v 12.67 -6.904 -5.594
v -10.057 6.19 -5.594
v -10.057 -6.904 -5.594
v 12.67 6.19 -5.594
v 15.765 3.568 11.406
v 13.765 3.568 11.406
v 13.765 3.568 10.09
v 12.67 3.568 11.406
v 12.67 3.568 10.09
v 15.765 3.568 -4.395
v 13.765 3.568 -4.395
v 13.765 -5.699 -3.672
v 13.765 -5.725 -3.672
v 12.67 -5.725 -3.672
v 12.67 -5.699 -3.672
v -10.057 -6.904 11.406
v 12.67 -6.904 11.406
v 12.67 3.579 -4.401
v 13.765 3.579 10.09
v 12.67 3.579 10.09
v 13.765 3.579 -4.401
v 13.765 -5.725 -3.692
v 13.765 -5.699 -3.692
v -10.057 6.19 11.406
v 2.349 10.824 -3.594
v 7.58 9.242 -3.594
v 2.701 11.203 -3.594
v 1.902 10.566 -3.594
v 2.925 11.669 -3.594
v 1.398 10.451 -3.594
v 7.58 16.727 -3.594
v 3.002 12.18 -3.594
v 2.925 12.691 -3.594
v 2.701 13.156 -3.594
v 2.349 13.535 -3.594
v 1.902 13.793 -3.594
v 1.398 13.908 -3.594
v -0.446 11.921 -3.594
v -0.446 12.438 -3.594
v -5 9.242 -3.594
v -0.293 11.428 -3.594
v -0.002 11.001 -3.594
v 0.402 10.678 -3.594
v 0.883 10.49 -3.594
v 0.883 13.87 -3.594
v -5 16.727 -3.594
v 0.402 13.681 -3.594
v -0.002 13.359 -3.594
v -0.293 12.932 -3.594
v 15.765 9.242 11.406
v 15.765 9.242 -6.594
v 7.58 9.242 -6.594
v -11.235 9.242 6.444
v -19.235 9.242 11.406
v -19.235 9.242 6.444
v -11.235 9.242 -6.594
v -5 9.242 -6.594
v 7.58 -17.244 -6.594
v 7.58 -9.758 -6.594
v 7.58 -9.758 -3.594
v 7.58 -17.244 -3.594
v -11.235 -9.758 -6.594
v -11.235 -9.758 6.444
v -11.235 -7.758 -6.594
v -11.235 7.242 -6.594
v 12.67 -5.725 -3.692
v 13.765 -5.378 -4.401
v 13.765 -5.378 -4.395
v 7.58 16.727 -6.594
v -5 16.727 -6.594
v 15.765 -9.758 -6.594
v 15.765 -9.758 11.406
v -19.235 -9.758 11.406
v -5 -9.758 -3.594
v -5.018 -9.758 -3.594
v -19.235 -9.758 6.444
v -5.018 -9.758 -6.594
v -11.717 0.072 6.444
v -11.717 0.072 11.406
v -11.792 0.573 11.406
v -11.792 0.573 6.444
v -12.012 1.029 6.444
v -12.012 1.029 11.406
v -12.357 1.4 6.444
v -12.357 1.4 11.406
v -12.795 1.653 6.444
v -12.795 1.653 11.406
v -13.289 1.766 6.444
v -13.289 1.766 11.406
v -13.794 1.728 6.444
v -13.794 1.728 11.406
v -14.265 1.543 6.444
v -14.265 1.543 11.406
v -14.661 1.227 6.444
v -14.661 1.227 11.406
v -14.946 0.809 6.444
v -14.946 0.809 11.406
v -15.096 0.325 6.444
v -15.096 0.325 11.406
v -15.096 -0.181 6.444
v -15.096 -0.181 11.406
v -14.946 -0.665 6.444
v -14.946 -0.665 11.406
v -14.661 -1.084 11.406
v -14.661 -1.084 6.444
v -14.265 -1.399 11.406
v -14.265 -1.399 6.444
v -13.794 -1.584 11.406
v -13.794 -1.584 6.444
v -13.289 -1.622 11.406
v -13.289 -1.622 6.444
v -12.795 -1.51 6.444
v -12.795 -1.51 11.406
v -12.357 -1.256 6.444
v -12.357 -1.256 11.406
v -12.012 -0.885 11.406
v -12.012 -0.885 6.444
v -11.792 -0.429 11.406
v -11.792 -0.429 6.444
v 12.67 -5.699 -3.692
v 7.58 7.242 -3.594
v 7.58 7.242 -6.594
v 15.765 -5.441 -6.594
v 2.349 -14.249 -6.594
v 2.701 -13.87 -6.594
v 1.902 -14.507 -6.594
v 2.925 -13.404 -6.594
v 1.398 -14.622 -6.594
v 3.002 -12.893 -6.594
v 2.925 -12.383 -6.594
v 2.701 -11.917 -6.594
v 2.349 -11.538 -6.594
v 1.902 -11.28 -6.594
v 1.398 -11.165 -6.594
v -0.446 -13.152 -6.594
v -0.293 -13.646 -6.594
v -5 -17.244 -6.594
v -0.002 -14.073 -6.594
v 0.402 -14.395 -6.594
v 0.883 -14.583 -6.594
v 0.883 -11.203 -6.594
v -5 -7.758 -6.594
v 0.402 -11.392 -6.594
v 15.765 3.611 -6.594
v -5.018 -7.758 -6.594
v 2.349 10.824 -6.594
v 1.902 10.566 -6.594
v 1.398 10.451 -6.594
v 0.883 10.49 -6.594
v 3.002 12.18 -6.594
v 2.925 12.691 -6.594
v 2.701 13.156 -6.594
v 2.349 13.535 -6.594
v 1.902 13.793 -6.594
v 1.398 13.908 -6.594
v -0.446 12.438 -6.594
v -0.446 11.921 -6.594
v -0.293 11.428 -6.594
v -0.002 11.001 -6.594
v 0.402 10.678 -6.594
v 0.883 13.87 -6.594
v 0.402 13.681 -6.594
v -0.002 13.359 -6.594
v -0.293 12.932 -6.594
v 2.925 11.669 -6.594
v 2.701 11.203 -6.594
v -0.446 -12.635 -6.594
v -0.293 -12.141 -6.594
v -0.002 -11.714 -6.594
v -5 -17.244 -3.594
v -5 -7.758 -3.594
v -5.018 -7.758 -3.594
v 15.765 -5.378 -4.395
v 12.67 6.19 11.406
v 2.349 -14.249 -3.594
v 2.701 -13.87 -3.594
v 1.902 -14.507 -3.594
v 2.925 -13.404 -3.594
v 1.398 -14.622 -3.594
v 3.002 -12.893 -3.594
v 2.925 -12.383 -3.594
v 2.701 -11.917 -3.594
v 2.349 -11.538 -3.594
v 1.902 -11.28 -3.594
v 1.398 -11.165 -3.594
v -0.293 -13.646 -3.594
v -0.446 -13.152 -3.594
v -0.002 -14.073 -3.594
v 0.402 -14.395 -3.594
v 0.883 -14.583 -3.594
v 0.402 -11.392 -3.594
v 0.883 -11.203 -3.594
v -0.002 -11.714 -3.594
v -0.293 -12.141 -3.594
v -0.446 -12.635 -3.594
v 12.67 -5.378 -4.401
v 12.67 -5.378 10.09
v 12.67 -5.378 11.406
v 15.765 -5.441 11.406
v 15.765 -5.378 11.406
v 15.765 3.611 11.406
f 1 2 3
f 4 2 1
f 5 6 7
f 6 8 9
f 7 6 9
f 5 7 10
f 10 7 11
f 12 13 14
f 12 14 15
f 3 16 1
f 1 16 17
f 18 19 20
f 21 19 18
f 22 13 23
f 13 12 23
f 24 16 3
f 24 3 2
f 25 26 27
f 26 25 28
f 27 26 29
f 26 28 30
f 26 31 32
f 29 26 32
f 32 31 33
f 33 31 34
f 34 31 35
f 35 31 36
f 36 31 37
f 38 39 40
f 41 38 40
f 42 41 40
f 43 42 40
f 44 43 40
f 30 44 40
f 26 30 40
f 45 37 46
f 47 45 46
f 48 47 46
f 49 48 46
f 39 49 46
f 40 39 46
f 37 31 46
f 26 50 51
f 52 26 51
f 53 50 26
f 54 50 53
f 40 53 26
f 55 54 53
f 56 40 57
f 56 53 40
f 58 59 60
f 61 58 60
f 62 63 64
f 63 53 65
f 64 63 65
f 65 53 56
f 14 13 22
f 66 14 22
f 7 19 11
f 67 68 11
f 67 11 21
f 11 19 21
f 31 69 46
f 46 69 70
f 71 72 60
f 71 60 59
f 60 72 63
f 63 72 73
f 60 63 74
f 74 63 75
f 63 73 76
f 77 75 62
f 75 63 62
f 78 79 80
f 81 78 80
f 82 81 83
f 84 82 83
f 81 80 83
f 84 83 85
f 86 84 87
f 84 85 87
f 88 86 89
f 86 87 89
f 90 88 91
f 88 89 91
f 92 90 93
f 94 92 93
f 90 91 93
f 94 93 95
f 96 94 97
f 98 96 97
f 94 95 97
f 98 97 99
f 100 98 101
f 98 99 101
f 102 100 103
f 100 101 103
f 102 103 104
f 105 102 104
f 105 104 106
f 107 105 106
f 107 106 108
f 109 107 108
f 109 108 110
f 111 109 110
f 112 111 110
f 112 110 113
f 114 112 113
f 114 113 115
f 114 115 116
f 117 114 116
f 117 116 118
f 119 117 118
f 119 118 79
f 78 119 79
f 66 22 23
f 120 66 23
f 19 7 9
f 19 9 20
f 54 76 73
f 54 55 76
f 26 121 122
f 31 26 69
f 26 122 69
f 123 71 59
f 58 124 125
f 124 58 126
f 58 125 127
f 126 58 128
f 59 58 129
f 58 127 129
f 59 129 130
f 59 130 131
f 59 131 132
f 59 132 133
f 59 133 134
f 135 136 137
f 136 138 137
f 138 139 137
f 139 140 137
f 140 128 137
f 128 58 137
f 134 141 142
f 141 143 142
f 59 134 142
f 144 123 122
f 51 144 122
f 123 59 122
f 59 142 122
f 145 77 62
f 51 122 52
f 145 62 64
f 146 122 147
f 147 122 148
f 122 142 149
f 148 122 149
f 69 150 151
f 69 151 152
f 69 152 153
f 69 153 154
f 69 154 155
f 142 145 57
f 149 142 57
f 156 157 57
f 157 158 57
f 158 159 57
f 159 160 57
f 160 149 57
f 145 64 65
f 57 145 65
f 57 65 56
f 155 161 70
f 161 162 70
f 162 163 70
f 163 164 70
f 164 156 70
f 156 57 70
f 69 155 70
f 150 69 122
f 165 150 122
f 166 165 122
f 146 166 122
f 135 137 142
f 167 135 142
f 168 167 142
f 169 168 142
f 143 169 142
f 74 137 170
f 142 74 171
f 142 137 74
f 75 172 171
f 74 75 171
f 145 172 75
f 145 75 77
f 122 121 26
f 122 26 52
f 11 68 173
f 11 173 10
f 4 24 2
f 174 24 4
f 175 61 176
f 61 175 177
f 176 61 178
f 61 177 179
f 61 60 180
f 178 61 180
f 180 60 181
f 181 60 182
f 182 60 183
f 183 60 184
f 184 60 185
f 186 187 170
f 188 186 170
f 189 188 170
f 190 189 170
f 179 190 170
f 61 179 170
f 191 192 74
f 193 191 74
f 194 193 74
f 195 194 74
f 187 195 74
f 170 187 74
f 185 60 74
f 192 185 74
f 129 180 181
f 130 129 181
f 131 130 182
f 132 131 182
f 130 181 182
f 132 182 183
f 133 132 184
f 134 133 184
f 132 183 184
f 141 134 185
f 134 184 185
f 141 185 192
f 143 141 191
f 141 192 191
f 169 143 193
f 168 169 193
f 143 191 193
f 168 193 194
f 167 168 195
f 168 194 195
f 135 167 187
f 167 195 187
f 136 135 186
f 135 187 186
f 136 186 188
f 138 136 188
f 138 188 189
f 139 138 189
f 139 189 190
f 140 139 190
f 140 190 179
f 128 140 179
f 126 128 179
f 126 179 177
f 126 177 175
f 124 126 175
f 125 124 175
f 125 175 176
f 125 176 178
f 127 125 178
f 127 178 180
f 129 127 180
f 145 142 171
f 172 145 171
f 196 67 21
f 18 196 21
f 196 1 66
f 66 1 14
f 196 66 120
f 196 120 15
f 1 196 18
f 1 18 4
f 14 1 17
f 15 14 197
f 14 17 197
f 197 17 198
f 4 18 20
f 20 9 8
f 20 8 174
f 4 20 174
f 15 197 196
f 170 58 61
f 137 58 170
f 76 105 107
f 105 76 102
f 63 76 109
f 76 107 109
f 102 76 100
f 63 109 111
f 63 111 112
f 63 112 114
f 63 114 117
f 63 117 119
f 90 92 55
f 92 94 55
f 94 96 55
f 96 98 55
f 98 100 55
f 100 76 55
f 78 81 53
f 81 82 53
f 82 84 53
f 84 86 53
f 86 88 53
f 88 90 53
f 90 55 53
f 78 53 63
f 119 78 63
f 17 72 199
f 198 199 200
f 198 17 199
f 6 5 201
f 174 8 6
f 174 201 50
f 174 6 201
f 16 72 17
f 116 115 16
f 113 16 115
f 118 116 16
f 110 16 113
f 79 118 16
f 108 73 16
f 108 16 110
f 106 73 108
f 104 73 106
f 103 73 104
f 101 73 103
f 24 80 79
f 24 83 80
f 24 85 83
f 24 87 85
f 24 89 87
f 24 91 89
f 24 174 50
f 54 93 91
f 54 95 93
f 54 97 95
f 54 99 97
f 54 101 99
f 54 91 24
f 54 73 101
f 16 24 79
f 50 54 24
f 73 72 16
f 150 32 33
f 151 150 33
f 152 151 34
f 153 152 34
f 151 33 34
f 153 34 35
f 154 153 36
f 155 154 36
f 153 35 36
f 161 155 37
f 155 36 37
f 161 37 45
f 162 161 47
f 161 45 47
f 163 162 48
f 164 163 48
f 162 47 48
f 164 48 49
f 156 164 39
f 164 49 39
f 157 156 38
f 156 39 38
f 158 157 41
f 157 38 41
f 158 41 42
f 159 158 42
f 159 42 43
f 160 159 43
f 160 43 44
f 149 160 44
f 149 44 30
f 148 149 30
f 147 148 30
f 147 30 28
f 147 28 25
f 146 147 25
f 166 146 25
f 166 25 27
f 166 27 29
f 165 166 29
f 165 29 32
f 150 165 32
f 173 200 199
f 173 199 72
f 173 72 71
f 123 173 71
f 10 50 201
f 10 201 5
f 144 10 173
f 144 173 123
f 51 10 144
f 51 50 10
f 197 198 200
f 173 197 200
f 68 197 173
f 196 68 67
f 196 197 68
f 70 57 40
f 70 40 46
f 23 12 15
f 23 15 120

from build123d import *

# Parameters (mm, degrees)
SKETCH1_W            = 2.5
SKETCH1_H            = 1.5
BOSS_EXTRUDE1_DEPTH  = 1.8
SKETCH2_W            = 2.272709172
SKETCH2_H            = 1.309335963
CUT_EXTRUDE1_DEPTH   = 1.7
SKETCH3_W            = 0.001965442
SKETCH3_H            = 0.00266433
SKETCH3_W_2          = 1.44909182
SKETCH3_H_2          = 0.895759853
CUT_EXTRUDE2_DEPTH   = 1.8
SCALE1_SCALE         = 10
SKETCH6_W            = 3.399300392
SKETCH6_H            = 8.946780682
CUT_EXTRUDE4_DEPTH   = 10
SKETCH12_W           = 4.961896536
SKETCH12_H           = 15
BOSS_EXTRUDE5_DEPTH  = 8
SKETCH13_R           = 1.698754484
CUT_EXTRUDE6_DEPTH   = 34
SKETCH22_W           = 12.579678002
SKETCH22_H           = 9.485518979
BOSS_EXTRUDE10_DEPTH = 3
SKETCH25_R           = 1.733474482
CUT_EXTRUDE7_DEPTH   = 36
SKETCH26_W           = 6.246850144
SKETCH26_H           = 18
BOSS_EXTRUDE11_DEPTH = 2
SKETCH27_W           = 6.184798315
SKETCH27_H           = 18
BOSS_EXTRUDE12_DEPTH = 2
SKETCH28_W           = 12.580266047
SKETCH28_H           = 15
BOSS_EXTRUDE13_DEPTH = 2
SKETCH29_W           = 6.217055849
SKETCH29_H           = 18
BOSS_EXTRUDE14_DEPTH = 2
SKETCH30_W           = 6.149592849
SKETCH30_H           = 18
BOSS_EXTRUDE15_DEPTH = 2
SKETCH31_W           = 12.597557791
SKETCH31_H           = 15
BOSS_EXTRUDE16_DEPTH = 2
SKETCH32_W           = 8
SKETCH32_H           = 4.961896536
BOSS_EXTRUDE17_DEPTH = 2
SKETCH33_W           = 0.035793511
SKETCH33_H           = 18
BOSS_EXTRUDE18_DEPTH = 2
SKETCH34_W           = 8
SKETCH34_H           = 4.961896536
BOSS_EXTRUDE19_DEPTH = 2
SKETCH36_W           = 18
SKETCH36_H           = 4.317479632
BOSS_EXTRUDE20_DEPTH = 2
SKETCH37_W           = 18
SKETCH37_H           = 5.630697462
BOSS_EXTRUDE21_DEPTH = 2
SKETCH38_W           = 2.199407661
SKETCH38_H           = 9.051822906
BOSS_EXTRUDE22_DEPTH = 2
SKETCH39_W           = 15.800592339
SKETCH39_H           = 0.042851216
BOSS_EXTRUDE23_DEPTH = 2
SKETCH40_W           = 15.800592339
SKETCH40_H           = 0.062191008
BOSS_EXTRUDE24_DEPTH = 2


with BuildPart() as part:
    # Sketch1 → Boss-Extrude1 (new body)
    with BuildSketch(Plane.XY):
        with Locations((0.15674366, 0.085055811)):
            Rectangle(SKETCH1_W, SKETCH1_H)
    extrude(amount=BOSS_EXTRUDE1_DEPTH)

    # Sketch2 → Cut-Extrude1 (cut)
    with BuildSketch(Plane.XY.offset(1.8)):
        with Locations((0.160861454, 0.075181403)):
            Rectangle(SKETCH2_W, SKETCH2_H)
    extrude(amount=-CUT_EXTRUDE1_DEPTH, mode=Mode.SUBTRACT)

    # Sketch3 → Cut-Extrude2 (cut)
    with BuildSketch(Plane(origin=(1.40674366, 0, 0), x_dir=(0, 0, -1), z_dir=(1, 0, 0))):
        with Locations((-0.29122496, -0.460339146)):
            Rectangle(SKETCH3_W, SKETCH3_H)
        with Locations((-0.943862586, 0.020902802)):
            Rectangle(SKETCH3_W_2, SKETCH3_H_2)
    extrude(amount=-CUT_EXTRUDE2_DEPTH, mode=Mode.SUBTRACT)


with BuildPart() as part_1:
    # Scale1: scaled about (0.033599126, 0.123190455, 0.732690955)
    add(part.part.scale(SCALE1_SCALE).moved(Location((-0.302392134, -1.108714095, -6.594218595))))

    # Sketch6 → Cut-Extrude4 (cut)
    with BuildSketch(Plane(origin=(13.765044467, 0, 0), x_dir=(0, 0, -1), z_dir=(1, 0, 0))):
        with Locations((-11.016576897, -0.905094997)):
            Rectangle(SKETCH6_W, SKETCH6_H)
    extrude(amount=-CUT_EXTRUDE4_DEPTH, mode=Mode.SUBTRACT)

    # Sketch12 → Boss-Extrude5 (add)
    with BuildSketch(Plane.ZY.offset(11.234955533)):
        with Locations((8.924833137, -0.258155978)):
            Rectangle(SKETCH12_W, SKETCH12_H)
    extrude(amount=BOSS_EXTRUDE5_DEPTH)

    # Sketch13 → Cut-Extrude6 (cut)
    with BuildSketch(Plane.XY.offset(11.405781405)):
        with Locations((-13.415722705, 0.071814751)):
            Circle(SKETCH13_R)
    extrude(amount=-CUT_EXTRUDE6_DEPTH, mode=Mode.SUBTRACT)

    # Sketch22 → Boss-Extrude10 (add)
    with BuildSketch(Plane(origin=(0, 0, -6.594218595), x_dir=(-1, 0, 0), z_dir=(0, 0, -1))):
        with Locations((-1.289819106, 11.984603512)):
            Rectangle(SKETCH22_W, SKETCH22_H)
        with Locations((-1.289819106, -12.500915468)):
            Rectangle(SKETCH22_W, SKETCH22_H)
    extrude(amount=-BOSS_EXTRUDE10_DEPTH)

    # Sketch25 → Cut-Extrude7 (cut)
    with BuildSketch(Plane.XY.offset(-3.594218595)):
        with Locations((1.268574204, 12.179653892)):
            Circle(SKETCH25_R)
        with Locations((1.268574204, -12.893454026)):
            Circle(SKETCH25_R)
    extrude(amount=-CUT_EXTRUDE7_DEPTH, mode=Mode.SUBTRACT)

    # Sketch26 → Boss-Extrude11 (add)
    with BuildSketch(Plane(origin=(0, 7.241844022, 0), x_dir=(1, 0, 0), z_dir=(0, 1, 0))):
        with Locations((-8.111530461, -2.405781405)):
            Rectangle(SKETCH26_W, SKETCH26_H)
    extrude(amount=BOSS_EXTRUDE11_DEPTH)

    # Sketch27 → Boss-Extrude12 (add)
    with BuildSketch(Plane(origin=(0, 7.241844022, 0), x_dir=(1, 0, 0), z_dir=(0, 1, 0))):
        with Locations((10.67264531, -2.405781405)):
            Rectangle(SKETCH27_W, SKETCH27_H)
    extrude(amount=BOSS_EXTRUDE12_DEPTH)

    # Sketch28 → Boss-Extrude13 (add)
    with BuildSketch(Plane(origin=(0, 7.241844022, 0), x_dir=(1, 0, 0), z_dir=(0, 1, 0))):
        with Locations((1.290113129, -3.905781405)):
            Rectangle(SKETCH28_W, SKETCH28_H)
    extrude(amount=BOSS_EXTRUDE13_DEPTH)

    # Sketch29 → Boss-Extrude14 (add)
    with BuildSketch(Plane(origin=(0, -7.758155978, 0), x_dir=(-1, 0, 0), z_dir=(0, -1, 0))):
        with Locations((8.126427609, -2.405781405)):
            Rectangle(SKETCH29_W, SKETCH29_H)
    extrude(amount=BOSS_EXTRUDE14_DEPTH)

    # Sketch30 → Boss-Extrude15 (add)
    with BuildSketch(Plane(origin=(0, -7.758155978, 0), x_dir=(-1, 0, 0), z_dir=(0, -1, 0))):
        with Locations((-10.690248043, -2.405781405)):
            Rectangle(SKETCH30_W, SKETCH30_H)
    extrude(amount=BOSS_EXTRUDE15_DEPTH)

    # Sketch31 → Boss-Extrude16 (add)
    with BuildSketch(Plane.XZ.offset(7.758155978)):
        with Locations((1.280879211, 3.905781405)):
            Rectangle(SKETCH31_W, SKETCH31_H)
    extrude(amount=BOSS_EXTRUDE16_DEPTH)

    # Sketch32 → Boss-Extrude17 (add)
    with BuildSketch(Plane(origin=(0, 7.241844022, 0), x_dir=(1, 0, 0), z_dir=(0, 1, 0))):
        with Locations((-15.234955533, -8.924833137)):
            Rectangle(SKETCH32_W, SKETCH32_H)
    extrude(amount=BOSS_EXTRUDE17_DEPTH)

    # Sketch33 → Boss-Extrude18 (add)
    with BuildSketch(Plane(origin=(0, -7.758155978, 0), x_dir=(-1, 0, 0), z_dir=(0, -1, 0))):
        with Locations((-7.597554863, -2.405781405)):
            Rectangle(SKETCH33_W, SKETCH33_H)
    extrude(amount=BOSS_EXTRUDE18_DEPTH)

    # Sketch34 → Boss-Extrude19 (add)
    with BuildSketch(Plane.XZ.offset(7.758155978)):
        with Locations((-15.234955533, 8.924833137)):
            Rectangle(SKETCH34_W, SKETCH34_H)
    extrude(amount=BOSS_EXTRUDE19_DEPTH)

    # Sketch36 → Boss-Extrude20 (add)
    with BuildSketch(Plane(origin=(13.765044467, 0, 0), x_dir=(0, 0, -1), z_dir=(1, 0, 0))):
        with Locations((-2.405781405, -7.599416162)):
            Rectangle(SKETCH36_W, SKETCH36_H)
    extrude(amount=BOSS_EXTRUDE20_DEPTH)

    # Sketch37 → Boss-Extrude21 (add)
    with BuildSketch(Plane(origin=(13.765044467, 0, 0), x_dir=(0, 0, -1), z_dir=(1, 0, 0))):
        with Locations((-2.405781405, 6.426495291)):
            Rectangle(SKETCH37_W, SKETCH37_H)
    extrude(amount=BOSS_EXTRUDE21_DEPTH)

    # Sketch38 → Boss-Extrude22 (add)
    with BuildSketch(Plane(origin=(13.765044467, 0, 0), x_dir=(0, 0, -1), z_dir=(1, 0, 0))):
        with Locations((5.494514764, -0.914764893)):
            Rectangle(SKETCH38_W, SKETCH38_H)
    extrude(amount=BOSS_EXTRUDE22_DEPTH)

    # Sketch39 → Boss-Extrude23 (add)
    with BuildSketch(Plane(origin=(13.765044467, 0, 0), x_dir=(0, 0, -1), z_dir=(1, 0, 0))):
        with Locations((-3.505485236, 3.589720952)):
            Rectangle(SKETCH39_W, SKETCH39_H)
    extrude(amount=BOSS_EXTRUDE23_DEPTH)

    # Sketch40 → Boss-Extrude24 (add)
    with BuildSketch(Plane(origin=(13.765044467, 0, 0), x_dir=(0, 0, -1), z_dir=(1, 0, 0))):
        with Locations((-3.505485236, -5.409580842)):
            Rectangle(SKETCH40_W, SKETCH40_H)
    extrude(amount=BOSS_EXTRUDE24_DEPTH)


solid = part_1.part
